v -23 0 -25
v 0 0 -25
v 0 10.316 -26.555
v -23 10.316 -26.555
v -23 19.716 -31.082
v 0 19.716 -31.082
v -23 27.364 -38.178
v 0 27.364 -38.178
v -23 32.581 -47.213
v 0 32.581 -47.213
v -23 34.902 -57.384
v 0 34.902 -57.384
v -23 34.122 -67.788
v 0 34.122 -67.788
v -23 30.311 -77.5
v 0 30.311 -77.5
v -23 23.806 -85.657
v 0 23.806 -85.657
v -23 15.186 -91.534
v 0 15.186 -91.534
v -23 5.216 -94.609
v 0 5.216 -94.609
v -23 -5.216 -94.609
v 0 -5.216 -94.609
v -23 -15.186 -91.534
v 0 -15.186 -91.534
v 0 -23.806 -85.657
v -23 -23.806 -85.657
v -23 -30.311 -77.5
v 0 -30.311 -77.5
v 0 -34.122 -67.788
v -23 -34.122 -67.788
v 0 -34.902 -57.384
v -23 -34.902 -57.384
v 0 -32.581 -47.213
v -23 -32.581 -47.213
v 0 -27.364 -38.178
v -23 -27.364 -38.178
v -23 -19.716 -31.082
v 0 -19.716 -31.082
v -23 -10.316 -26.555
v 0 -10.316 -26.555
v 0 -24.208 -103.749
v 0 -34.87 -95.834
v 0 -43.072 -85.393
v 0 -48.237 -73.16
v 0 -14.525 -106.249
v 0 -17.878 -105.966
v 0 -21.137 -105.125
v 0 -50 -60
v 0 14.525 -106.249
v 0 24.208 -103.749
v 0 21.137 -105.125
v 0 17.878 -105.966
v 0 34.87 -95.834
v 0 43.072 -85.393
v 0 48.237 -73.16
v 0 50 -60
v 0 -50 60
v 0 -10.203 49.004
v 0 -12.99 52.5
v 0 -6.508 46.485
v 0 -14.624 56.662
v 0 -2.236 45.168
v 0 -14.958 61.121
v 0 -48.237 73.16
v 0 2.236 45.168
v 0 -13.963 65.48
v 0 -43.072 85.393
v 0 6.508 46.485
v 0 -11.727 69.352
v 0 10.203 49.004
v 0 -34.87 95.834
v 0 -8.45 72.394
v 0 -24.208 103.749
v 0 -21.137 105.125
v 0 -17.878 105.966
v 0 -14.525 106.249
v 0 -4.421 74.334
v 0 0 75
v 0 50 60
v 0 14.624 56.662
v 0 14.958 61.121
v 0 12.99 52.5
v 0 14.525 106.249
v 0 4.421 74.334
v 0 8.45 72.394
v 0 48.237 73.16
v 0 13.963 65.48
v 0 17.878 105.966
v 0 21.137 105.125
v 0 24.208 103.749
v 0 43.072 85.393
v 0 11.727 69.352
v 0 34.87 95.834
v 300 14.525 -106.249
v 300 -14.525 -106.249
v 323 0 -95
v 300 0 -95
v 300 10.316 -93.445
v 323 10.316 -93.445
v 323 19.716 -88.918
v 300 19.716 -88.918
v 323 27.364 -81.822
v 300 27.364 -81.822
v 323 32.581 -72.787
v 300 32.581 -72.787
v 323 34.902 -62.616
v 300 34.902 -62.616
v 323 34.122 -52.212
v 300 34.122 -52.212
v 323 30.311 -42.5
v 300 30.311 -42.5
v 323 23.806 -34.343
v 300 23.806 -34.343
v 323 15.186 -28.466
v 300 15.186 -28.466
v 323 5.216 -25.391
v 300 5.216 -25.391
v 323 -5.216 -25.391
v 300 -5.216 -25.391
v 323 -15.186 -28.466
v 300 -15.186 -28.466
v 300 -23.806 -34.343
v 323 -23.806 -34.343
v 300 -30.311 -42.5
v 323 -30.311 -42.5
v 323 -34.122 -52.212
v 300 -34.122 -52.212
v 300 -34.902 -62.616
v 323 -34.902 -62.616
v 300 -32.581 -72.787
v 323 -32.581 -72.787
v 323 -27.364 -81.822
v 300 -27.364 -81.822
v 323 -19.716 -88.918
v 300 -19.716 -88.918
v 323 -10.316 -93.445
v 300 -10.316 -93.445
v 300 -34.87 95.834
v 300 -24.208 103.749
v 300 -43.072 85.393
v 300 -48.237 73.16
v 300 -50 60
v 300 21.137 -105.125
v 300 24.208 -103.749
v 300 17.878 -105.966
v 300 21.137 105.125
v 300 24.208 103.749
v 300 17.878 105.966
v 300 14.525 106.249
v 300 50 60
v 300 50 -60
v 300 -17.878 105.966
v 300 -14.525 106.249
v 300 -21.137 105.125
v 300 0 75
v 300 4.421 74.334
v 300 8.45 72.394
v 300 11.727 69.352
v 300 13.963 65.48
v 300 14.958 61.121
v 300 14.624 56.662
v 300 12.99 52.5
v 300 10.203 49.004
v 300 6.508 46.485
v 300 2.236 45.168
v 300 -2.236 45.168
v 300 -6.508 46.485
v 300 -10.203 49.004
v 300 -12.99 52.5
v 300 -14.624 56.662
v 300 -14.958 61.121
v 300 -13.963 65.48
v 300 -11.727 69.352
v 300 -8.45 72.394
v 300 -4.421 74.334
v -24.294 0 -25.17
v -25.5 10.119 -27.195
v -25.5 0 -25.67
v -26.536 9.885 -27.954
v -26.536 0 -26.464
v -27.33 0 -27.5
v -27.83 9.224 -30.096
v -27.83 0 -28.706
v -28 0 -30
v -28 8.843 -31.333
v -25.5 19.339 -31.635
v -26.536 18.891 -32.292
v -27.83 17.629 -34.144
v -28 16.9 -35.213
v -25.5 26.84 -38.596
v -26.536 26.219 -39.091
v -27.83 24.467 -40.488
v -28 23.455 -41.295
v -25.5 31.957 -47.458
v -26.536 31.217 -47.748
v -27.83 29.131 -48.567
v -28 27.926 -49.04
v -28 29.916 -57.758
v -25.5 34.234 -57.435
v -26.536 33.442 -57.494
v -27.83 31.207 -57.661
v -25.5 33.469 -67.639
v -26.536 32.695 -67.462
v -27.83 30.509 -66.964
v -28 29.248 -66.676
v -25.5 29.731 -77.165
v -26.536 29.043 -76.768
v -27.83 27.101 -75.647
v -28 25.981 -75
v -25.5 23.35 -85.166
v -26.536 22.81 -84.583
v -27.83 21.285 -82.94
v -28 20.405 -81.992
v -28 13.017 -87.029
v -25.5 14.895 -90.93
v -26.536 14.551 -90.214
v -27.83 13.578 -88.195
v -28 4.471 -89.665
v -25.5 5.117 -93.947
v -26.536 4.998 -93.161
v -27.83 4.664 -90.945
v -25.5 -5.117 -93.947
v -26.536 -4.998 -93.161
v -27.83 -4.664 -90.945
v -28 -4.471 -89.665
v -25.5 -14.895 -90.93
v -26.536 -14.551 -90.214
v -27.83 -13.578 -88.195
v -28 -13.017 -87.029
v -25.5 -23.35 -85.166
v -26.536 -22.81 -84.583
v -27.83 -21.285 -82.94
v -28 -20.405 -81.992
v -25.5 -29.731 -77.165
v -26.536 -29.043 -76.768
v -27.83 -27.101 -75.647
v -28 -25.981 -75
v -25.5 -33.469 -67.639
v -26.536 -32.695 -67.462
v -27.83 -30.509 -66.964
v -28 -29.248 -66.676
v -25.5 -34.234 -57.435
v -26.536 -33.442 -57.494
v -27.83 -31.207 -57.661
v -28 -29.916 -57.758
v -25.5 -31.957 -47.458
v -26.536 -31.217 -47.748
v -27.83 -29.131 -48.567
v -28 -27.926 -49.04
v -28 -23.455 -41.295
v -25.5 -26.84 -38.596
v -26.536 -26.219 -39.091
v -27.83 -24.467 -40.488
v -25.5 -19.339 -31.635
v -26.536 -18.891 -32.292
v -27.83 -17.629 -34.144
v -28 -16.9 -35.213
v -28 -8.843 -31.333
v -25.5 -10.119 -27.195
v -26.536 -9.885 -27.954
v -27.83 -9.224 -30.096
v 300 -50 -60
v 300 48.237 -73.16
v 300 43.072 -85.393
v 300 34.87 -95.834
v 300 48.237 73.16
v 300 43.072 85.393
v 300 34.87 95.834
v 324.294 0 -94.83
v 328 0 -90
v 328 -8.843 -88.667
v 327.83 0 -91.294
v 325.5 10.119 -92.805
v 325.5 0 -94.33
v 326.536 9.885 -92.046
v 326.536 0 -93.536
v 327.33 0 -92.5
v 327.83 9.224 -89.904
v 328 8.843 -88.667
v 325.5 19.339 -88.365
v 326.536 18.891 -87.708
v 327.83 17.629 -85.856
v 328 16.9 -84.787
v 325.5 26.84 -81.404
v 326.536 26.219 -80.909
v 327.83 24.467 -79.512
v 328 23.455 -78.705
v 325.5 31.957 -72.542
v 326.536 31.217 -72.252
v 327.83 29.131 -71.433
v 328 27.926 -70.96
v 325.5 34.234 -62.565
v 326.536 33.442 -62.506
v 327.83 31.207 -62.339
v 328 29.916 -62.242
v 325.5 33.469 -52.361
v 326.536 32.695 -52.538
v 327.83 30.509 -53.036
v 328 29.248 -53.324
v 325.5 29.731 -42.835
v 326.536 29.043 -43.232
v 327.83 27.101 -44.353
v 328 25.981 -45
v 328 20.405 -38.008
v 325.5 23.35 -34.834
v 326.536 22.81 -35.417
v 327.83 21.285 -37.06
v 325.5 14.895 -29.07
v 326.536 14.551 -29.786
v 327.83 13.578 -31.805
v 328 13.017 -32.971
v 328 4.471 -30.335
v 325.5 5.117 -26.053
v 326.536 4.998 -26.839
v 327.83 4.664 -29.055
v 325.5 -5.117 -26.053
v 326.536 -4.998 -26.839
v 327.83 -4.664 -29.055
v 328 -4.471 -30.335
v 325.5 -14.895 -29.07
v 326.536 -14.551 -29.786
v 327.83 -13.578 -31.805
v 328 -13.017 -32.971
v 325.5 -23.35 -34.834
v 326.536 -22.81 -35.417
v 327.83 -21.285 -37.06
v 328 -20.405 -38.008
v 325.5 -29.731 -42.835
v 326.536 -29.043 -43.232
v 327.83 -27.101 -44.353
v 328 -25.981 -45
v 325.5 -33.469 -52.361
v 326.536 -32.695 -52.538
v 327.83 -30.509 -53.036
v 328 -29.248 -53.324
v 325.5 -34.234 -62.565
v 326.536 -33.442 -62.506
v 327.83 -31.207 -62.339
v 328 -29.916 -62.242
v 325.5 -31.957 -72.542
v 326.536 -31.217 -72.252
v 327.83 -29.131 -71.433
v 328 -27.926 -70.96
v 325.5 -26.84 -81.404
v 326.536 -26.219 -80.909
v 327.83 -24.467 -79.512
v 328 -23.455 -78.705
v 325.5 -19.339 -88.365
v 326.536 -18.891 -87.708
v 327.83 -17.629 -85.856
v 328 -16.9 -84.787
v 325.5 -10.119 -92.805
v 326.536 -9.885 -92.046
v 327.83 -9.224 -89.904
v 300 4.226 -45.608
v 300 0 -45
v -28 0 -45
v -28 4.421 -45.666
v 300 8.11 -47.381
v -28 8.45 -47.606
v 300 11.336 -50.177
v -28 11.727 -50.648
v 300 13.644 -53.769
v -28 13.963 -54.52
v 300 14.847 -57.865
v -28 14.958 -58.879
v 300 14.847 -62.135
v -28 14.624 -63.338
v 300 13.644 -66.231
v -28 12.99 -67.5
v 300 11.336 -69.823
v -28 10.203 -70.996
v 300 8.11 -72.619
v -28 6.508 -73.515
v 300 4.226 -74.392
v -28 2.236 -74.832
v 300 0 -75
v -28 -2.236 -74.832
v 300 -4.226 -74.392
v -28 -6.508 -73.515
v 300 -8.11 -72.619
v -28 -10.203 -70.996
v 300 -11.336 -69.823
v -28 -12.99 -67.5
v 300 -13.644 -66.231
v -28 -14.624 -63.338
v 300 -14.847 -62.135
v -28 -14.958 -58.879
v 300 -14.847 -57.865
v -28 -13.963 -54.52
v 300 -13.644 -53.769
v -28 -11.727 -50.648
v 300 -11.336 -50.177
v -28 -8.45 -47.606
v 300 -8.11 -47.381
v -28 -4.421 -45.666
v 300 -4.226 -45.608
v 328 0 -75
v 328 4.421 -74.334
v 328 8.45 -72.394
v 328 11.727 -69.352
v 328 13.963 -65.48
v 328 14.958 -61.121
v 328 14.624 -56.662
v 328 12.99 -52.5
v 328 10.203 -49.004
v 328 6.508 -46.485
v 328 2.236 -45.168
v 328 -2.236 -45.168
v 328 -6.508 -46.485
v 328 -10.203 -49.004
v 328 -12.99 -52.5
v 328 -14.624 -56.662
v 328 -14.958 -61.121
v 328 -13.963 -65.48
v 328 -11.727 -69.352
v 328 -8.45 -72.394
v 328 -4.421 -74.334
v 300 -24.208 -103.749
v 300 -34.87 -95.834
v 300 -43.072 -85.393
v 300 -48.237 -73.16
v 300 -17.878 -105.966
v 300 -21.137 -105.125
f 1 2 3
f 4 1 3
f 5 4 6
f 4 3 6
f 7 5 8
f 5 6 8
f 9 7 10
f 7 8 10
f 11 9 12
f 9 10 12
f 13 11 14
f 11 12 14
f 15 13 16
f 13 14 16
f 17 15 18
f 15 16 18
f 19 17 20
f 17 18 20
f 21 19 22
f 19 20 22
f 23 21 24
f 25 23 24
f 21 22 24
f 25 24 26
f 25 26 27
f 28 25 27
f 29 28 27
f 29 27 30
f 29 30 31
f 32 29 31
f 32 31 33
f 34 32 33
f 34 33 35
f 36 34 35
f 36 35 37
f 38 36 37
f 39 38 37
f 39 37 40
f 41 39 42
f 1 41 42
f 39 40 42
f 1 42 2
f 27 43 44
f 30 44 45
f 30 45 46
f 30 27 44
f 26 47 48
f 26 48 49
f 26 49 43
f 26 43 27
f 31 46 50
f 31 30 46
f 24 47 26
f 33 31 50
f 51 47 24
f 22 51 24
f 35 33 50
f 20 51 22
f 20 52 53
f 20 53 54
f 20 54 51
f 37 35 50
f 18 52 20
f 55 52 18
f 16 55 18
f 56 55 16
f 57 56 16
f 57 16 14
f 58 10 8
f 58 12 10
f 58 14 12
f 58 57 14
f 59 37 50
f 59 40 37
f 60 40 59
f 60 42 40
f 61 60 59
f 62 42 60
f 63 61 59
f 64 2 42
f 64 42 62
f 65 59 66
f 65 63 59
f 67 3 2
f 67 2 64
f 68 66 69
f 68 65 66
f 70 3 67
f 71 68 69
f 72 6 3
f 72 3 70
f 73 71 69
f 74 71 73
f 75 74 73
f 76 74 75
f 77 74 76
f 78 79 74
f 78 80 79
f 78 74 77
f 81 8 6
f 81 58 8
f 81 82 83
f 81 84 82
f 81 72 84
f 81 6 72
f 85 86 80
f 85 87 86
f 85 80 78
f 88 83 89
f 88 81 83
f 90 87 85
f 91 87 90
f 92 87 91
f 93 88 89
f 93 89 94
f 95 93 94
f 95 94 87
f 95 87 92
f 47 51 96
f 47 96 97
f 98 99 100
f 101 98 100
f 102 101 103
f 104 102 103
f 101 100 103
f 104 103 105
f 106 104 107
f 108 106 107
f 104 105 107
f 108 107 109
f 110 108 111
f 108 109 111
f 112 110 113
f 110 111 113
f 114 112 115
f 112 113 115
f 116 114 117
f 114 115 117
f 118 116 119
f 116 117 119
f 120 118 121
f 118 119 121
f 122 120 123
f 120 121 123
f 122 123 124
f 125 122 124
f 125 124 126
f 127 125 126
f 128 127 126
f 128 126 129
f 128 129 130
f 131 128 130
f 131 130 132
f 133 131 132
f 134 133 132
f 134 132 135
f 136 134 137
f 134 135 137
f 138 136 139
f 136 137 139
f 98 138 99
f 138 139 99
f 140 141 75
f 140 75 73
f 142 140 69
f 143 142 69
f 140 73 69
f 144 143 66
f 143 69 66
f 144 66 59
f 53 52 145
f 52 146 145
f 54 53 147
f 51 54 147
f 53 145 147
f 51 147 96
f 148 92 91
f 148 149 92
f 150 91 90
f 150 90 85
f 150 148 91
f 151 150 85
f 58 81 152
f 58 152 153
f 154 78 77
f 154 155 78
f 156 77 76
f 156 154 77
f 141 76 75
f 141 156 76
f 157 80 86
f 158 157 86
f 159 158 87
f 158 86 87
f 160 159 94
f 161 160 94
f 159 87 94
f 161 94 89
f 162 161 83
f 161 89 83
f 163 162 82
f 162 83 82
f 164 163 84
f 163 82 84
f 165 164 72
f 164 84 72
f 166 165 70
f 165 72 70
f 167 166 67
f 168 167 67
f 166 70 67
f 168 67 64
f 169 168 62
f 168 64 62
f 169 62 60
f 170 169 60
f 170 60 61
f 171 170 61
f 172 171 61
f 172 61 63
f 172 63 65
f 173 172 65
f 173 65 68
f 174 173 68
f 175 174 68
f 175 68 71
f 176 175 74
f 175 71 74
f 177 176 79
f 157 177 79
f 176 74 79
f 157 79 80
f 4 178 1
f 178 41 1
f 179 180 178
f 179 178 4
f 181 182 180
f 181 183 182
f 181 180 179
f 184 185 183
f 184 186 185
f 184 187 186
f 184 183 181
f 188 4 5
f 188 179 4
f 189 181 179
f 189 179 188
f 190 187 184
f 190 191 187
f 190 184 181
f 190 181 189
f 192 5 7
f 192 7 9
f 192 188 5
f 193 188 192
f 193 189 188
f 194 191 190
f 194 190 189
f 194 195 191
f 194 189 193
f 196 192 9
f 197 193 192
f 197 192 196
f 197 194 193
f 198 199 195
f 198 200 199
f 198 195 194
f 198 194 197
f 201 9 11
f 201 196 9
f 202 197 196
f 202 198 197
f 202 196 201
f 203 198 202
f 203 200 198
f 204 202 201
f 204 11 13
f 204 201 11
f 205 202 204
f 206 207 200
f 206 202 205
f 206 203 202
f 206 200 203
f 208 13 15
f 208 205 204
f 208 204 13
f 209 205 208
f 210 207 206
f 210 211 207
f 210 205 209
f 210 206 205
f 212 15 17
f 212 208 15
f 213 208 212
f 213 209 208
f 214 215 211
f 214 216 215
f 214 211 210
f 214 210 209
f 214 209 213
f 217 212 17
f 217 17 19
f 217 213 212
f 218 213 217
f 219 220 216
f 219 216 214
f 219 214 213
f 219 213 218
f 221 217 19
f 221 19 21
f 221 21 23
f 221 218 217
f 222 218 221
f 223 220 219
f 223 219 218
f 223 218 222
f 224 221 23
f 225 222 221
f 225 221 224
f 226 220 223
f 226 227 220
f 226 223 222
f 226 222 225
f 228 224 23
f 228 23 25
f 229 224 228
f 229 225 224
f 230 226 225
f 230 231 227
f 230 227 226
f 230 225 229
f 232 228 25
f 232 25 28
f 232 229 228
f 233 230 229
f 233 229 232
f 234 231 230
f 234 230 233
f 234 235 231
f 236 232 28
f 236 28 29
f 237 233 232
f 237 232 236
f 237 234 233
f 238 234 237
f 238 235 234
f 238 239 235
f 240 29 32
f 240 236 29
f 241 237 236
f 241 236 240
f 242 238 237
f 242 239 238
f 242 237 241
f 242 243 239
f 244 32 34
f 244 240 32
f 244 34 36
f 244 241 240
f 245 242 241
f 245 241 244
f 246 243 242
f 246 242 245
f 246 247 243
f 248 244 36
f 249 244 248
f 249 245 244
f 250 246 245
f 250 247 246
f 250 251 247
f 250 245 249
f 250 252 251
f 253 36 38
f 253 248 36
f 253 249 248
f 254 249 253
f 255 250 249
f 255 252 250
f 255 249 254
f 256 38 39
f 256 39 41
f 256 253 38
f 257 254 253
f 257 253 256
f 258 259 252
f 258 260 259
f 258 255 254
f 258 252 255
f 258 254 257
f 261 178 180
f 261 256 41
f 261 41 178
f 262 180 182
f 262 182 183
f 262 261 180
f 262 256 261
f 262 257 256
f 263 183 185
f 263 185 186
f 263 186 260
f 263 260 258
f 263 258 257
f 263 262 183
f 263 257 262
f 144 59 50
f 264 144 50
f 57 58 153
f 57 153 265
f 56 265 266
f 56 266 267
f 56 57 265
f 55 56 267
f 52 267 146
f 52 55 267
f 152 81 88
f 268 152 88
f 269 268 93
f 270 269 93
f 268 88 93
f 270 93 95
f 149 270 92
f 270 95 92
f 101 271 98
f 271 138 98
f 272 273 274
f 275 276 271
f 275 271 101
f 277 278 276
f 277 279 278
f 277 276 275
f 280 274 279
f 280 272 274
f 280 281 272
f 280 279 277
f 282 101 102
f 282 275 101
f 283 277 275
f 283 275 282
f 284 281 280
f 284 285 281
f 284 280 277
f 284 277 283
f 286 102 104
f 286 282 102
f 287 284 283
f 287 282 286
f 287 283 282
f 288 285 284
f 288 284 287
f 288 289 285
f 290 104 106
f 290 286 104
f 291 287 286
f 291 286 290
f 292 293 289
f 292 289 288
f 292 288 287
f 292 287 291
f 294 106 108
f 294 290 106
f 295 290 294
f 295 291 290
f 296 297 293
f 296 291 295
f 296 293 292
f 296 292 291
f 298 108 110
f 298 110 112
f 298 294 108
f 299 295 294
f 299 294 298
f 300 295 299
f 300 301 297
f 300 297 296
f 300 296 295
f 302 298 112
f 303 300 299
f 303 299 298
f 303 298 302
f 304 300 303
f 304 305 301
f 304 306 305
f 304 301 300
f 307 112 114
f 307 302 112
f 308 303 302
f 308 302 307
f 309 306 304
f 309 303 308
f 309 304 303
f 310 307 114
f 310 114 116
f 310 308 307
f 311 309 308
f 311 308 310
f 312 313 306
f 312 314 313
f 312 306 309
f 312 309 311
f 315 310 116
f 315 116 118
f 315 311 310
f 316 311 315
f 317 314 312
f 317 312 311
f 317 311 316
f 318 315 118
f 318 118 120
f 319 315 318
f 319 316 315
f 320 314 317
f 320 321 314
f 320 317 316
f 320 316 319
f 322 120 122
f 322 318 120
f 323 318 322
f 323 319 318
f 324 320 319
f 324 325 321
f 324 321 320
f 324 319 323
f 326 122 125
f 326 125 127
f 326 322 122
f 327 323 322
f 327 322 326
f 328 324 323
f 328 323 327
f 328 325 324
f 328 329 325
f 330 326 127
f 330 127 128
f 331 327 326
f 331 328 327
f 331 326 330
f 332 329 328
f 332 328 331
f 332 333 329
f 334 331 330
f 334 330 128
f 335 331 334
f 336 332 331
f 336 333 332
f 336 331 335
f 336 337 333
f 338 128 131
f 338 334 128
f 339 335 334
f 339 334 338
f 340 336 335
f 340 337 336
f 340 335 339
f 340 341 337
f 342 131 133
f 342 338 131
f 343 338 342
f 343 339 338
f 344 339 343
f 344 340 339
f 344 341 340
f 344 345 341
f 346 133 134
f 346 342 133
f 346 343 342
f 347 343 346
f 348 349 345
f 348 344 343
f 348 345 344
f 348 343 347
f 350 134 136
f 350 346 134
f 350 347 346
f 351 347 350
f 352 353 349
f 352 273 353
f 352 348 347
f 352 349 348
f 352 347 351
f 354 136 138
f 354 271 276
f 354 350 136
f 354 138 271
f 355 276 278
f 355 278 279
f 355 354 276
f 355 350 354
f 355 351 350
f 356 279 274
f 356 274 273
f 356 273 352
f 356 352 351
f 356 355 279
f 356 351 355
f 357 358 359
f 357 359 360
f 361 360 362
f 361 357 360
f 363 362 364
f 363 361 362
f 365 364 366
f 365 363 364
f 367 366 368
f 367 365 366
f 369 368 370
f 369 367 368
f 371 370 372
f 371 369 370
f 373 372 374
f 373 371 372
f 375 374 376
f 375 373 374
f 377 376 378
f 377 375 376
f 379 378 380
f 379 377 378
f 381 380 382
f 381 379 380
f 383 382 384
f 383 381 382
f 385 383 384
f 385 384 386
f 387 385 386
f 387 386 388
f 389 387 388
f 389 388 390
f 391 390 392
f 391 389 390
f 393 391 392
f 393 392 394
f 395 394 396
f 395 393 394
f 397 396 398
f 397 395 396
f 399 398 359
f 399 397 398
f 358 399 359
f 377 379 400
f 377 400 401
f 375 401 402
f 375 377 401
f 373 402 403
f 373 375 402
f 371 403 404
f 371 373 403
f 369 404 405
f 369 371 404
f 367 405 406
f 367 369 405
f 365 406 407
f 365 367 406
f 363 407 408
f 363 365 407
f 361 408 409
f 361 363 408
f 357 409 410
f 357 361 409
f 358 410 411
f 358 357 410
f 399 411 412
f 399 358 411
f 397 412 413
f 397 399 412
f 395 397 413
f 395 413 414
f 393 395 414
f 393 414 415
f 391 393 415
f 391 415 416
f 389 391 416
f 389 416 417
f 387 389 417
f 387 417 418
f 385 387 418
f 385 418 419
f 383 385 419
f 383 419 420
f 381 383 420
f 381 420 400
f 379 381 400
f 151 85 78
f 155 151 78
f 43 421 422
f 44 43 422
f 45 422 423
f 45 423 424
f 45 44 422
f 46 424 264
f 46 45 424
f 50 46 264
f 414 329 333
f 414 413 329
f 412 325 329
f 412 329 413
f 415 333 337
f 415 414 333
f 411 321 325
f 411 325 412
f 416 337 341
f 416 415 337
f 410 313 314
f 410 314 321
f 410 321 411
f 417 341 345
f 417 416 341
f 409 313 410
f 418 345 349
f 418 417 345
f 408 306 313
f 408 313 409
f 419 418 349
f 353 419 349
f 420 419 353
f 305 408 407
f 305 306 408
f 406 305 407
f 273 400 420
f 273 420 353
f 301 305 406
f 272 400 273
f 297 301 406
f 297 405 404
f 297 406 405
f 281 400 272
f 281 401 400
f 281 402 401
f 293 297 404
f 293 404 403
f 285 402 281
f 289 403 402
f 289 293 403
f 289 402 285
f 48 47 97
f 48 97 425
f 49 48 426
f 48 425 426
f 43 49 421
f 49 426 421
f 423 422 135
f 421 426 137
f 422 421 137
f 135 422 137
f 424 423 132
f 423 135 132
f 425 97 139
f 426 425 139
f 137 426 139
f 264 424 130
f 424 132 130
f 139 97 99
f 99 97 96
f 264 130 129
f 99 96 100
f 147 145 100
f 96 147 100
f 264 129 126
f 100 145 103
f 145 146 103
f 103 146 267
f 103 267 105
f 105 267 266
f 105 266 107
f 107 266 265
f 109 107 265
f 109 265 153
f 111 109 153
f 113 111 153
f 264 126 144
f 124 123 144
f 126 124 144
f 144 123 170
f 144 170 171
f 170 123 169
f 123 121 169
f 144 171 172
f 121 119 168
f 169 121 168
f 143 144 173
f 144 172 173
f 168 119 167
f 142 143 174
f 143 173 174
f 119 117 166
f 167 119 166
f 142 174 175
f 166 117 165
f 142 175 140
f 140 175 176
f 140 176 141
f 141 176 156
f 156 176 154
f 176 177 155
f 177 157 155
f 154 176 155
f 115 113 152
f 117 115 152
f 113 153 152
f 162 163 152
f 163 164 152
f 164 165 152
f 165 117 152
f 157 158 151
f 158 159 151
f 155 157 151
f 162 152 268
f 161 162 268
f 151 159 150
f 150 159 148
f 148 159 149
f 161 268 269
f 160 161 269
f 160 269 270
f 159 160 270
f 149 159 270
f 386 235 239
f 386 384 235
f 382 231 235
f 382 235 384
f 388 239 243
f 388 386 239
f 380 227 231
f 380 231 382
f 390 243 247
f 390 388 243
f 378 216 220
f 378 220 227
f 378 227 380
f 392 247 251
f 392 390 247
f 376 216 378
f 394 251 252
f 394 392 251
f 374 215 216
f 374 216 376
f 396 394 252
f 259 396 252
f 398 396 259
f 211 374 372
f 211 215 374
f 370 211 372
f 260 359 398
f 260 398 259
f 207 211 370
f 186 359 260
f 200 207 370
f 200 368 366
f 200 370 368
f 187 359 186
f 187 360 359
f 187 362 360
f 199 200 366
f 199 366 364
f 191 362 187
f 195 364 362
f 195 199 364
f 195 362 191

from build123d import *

# Parameters (mm, degrees)
SKETCH_2_W          = 120
SKETCH_2_H          = 100
EXTRUDE_1_DEPTH     = 300
SKETCH_3_R          = 15
CUT_EXTRUDE_1_DEPTH = 300
SKETCH_4_R          = 35
SKETCH_4_R_2        = 15
EXTRUDE_2_DEPTH     = 28
SKETCH_6_R          = 35
SKETCH_6_R_2        = 15
EXTRUDE_3_DEPTH     = 28
FILLET_2_R          = 5
FILLET_3_R          = 20


with BuildPart() as part:
    # 草图2 → 凸台-拉伸1 (new body)
    with BuildSketch(Plane(origin=(0, 0, 0), x_dir=(0, 0, -1), z_dir=(1, 0, 0))):
        with BuildLine():
            Line((106.249324319, 19), (106.249324319, -19))
            ThreePointArc((106.249324319, -19), (10, 0), (106.249324319, 19))
        make_face()
        Rectangle(SKETCH_2_W, SKETCH_2_H)
        with BuildLine():
            Line((-106.249324319, 19), (-106.249324319, -19))
            ThreePointArc((-106.249324319, -19), (-10, 0), (-106.249324319, 19))
        make_face()
    extrude(amount=EXTRUDE_1_DEPTH)

    # 草图3 → 切除-拉伸1 (cut)
    with BuildSketch(Plane.ZY):
        with Locations((60, 0)):
            Circle(SKETCH_3_R)
        with Locations((-60, 0)):
            Circle(SKETCH_3_R)
    extrude(amount=-CUT_EXTRUDE_1_DEPTH, mode=Mode.SUBTRACT)

    # 草图4 → 凸台-拉伸2 (add)
    with BuildSketch(Plane.ZY):
        with Locations((-60, 0)):
            Circle(SKETCH_4_R)
        with Locations((-60, 0)):
            Circle(SKETCH_4_R_2, mode=Mode.SUBTRACT)
    extrude(amount=EXTRUDE_2_DEPTH)

    # 草图6 → 凸台-拉伸3 (add)
    with BuildSketch(Plane(origin=(300, 0, 0), x_dir=(0, 0, -1), z_dir=(1, 0, 0))):
        with Locations((60, 0)):
            Circle(SKETCH_6_R)
        with Locations((60, 0)):
            Circle(SKETCH_6_R_2, mode=Mode.SUBTRACT)
    extrude(amount=EXTRUDE_3_DEPTH)

    # 圆角2
    fillet_2_edges = [part.edges().sort_by_distance(p)[0] for p in [
        (-28, 0, -95),
        (328, 0, -25),
    ]]
    fillet(fillet_2_edges, radius=FILLET_2_R)

    # 圆角3
    fillet_3_edges = [part.edges().sort_by_distance(p)[0] for p in [
        (150, -19, 106.249324319),
        (150, 19, 106.249324319),
        (150, 19, -106.249324319),
        (150, -19, -106.249324319),
    ]]
    fillet(fillet_3_edges, radius=FILLET_3_R)


solid = part.part
